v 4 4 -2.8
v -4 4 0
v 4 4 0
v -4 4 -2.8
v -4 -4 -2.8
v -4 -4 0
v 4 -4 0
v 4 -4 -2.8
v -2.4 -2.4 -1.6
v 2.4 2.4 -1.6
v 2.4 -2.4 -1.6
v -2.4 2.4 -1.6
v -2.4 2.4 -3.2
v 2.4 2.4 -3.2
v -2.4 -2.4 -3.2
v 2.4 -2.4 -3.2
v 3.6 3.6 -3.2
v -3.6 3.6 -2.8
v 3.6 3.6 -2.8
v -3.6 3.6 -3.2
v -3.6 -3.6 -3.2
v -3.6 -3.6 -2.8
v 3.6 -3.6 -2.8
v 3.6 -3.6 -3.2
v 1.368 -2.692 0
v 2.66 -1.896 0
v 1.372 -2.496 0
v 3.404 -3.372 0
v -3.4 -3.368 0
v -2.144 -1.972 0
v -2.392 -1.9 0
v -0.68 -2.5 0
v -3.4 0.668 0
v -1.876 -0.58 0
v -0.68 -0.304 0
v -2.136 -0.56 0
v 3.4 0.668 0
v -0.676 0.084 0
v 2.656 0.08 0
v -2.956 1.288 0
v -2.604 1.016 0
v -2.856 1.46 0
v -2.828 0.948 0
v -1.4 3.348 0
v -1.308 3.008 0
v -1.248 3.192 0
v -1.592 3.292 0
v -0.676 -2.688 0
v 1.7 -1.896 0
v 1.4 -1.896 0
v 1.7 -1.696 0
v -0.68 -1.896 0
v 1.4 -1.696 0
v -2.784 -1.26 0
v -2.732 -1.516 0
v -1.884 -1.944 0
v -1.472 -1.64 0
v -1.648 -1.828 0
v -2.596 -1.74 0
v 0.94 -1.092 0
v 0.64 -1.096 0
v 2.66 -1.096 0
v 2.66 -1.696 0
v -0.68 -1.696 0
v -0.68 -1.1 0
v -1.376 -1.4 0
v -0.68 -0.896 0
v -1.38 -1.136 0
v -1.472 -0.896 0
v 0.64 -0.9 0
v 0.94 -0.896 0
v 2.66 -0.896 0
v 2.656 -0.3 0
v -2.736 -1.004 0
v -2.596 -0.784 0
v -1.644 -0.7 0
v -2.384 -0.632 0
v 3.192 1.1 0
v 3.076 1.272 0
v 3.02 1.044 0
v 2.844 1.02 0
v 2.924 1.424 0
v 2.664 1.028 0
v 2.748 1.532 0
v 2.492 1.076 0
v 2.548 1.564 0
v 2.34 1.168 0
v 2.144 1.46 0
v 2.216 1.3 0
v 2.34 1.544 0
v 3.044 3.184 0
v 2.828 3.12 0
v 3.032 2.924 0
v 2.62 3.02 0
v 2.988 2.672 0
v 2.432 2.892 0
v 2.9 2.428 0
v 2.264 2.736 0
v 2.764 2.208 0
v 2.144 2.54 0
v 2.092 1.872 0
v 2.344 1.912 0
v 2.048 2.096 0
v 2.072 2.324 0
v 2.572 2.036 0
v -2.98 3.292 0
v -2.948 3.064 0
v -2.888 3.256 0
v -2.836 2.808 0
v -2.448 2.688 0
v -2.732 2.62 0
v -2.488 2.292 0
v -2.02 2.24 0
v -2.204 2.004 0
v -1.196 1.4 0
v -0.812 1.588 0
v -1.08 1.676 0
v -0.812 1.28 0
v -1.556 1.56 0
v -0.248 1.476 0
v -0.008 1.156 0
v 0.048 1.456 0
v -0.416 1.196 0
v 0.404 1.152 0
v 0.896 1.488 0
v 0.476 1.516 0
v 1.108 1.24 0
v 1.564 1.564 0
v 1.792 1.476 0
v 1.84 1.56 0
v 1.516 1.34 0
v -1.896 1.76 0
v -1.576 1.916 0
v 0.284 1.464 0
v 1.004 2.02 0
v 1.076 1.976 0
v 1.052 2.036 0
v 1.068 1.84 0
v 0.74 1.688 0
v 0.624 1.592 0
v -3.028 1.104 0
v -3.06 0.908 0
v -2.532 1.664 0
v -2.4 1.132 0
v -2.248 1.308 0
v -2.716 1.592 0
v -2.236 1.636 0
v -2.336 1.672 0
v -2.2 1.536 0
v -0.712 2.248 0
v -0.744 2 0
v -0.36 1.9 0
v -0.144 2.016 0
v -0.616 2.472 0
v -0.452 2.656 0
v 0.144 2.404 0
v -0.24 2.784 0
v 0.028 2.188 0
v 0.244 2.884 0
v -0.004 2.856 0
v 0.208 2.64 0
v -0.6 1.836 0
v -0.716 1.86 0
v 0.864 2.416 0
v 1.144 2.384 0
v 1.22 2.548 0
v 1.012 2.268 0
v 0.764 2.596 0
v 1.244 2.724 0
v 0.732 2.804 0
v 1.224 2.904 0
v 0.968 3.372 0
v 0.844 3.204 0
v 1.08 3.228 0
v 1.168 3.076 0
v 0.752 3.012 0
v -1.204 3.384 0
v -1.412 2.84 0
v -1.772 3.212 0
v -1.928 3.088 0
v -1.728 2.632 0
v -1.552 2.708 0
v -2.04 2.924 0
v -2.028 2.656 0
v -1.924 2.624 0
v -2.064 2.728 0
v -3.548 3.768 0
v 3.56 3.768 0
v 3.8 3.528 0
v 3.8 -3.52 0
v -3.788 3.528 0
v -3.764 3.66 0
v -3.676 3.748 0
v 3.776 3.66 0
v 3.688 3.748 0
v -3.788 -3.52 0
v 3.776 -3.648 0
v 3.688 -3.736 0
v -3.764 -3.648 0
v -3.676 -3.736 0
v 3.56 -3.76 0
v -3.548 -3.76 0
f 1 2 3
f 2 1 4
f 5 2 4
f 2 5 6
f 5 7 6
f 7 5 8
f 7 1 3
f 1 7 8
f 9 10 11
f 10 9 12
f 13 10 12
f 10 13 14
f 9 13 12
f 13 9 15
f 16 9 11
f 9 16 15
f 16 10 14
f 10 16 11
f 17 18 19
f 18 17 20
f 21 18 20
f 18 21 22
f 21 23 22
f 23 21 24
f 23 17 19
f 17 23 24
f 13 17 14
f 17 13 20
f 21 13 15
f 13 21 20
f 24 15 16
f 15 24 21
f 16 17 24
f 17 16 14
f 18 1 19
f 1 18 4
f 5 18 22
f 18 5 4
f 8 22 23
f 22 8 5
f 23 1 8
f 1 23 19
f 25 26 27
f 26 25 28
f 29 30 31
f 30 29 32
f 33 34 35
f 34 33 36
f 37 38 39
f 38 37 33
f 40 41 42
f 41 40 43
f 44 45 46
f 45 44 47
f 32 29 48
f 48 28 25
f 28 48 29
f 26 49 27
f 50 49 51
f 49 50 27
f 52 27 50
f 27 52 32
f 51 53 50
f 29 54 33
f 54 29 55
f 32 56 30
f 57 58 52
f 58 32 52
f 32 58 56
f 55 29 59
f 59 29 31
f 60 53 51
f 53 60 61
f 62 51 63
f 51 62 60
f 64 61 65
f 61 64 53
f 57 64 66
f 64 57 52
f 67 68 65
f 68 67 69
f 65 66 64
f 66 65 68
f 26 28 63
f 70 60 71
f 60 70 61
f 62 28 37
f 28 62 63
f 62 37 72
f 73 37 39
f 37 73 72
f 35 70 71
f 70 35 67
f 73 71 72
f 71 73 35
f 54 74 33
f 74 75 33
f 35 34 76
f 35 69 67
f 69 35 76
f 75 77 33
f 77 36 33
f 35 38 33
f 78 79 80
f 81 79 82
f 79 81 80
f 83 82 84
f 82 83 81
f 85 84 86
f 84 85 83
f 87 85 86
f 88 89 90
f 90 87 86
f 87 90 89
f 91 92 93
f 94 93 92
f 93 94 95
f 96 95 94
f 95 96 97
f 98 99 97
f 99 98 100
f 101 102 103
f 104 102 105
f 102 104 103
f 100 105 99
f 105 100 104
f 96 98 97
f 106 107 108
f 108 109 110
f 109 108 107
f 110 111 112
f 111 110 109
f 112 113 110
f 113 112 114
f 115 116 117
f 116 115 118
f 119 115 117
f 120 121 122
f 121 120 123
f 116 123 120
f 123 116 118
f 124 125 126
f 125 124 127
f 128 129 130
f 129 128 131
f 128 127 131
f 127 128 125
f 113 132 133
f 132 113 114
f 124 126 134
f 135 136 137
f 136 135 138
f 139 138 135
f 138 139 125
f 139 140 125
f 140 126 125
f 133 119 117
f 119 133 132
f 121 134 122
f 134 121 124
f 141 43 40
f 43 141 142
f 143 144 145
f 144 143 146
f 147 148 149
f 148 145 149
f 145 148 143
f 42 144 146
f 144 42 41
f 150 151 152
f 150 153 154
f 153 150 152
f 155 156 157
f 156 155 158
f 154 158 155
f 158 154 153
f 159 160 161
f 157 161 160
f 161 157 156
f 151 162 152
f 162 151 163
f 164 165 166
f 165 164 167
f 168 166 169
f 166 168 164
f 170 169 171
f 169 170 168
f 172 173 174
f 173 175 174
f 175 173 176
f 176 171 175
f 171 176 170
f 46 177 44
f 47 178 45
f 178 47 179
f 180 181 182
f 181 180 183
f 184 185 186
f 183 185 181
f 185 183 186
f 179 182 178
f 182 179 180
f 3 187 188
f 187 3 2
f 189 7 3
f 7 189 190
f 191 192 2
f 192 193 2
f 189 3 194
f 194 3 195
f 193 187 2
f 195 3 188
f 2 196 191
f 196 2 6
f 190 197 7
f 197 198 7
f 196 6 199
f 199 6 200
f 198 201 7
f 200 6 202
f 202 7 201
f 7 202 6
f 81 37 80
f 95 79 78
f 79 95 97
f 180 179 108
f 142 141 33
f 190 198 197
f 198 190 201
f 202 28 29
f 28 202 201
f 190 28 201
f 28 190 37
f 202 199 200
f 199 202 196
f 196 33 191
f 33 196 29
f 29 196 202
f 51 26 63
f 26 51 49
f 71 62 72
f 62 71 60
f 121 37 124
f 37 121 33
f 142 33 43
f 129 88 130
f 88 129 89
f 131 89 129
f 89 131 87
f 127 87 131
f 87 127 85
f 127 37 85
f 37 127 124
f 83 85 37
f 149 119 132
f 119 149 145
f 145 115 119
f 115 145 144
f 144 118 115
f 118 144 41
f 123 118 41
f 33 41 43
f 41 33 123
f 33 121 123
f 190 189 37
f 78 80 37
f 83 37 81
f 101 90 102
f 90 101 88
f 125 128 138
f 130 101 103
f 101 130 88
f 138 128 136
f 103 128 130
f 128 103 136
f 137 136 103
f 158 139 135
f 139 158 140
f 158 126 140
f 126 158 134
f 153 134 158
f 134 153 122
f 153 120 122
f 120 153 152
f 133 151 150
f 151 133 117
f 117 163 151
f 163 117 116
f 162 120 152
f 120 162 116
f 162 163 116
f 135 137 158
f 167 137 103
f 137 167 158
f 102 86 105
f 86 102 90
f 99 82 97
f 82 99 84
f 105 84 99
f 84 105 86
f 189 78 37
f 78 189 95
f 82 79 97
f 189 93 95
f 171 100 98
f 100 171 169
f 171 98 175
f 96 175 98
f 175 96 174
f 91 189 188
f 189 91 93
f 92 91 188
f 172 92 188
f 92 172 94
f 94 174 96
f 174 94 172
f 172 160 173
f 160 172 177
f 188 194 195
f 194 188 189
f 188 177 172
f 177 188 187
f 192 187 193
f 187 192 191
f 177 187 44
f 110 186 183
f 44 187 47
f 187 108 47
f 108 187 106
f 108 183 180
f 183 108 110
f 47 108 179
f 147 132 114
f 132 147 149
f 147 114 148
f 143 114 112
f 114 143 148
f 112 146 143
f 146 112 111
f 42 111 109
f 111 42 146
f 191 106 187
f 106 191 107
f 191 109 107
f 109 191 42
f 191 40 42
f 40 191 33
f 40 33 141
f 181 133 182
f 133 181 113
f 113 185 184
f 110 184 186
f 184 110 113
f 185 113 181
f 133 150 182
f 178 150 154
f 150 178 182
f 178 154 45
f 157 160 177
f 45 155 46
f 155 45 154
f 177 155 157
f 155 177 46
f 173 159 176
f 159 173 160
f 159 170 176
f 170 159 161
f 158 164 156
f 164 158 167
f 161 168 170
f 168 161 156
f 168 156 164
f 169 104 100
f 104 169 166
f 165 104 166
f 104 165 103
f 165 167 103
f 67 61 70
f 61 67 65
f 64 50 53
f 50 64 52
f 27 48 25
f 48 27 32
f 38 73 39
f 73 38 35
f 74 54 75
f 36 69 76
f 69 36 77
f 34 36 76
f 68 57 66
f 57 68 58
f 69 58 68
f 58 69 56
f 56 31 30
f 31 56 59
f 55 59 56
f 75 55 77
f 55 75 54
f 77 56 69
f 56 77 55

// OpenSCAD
// file: ../p/box5.scad
use <../lib.scad>
function ldraw_lib__box5() = [
// 0 Box with 5 Faces and All Edges
// 0 Name: box5.dat
// 0 Author: James Jessiman
// 0 !LDRAW_ORG Primitive UPDATE 2012-01
// 0 !LICENSE Licensed under CC BY 4.0 : see CAreadme.txt
// 
// 0 BFC CERTIFY CCW
  [0,"BFC","CERTIFY"],
  [0,"BFC","CCW"],
// 
// 0 !HISTORY 2002-04-03 [sbliss] Modified for BFC compliance
// 0 !HISTORY 2002-04-25 [PTadmin] Official Update 2002-02
// 0 !HISTORY 2007-06-24 [PTadmin] Header formatted for Contributor Agreement
// 0 !HISTORY 2008-07-01 [PTadmin] Official Update 2008-01
// 0 !HISTORY 2012-02-16 [Philo] Changed to CCW
// 0 !HISTORY 2012-03-30 [PTadmin] Official Update 2012-01
// 
// 
// 2 24 1 1 1 -1 1 1
  [2,24,1,1,1,-1,1,1],
// 2 24 -1 1 1 -1 1 -1
  [2,24,-1,1,1,-1,1,-1],
// 2 24 -1 1 -1 1 1 -1
  [2,24,-1,1,-1,1,1,-1],
// 2 24 1 1 -1 1 1 1
  [2,24,1,1,-1,1,1,1],
// 2 24 1 0 1 -1 0 1
  [2,24,1,0,1,-1,0,1],
// 2 24 -1 0 1 -1 0 -1
  [2,24,-1,0,1,-1,0,-1],
// 2 24 -1 0 -1 1 0 -1
  [2,24,-1,0,-1,1,0,-1],
// 2 24 1 0 -1 1 0 1
  [2,24,1,0,-1,1,0,1],
// 2 24 1 0 1 1 1 1
  [2,24,1,0,1,1,1,1],
// 2 24 -1 0 1 -1 1 1
  [2,24,-1,0,1,-1,1,1],
// 2 24 1 0 -1 1 1 -1
  [2,24,1,0,-1,1,1,-1],
// 2 24 -1 0 -1 -1 1 -1
  [2,24,-1,0,-1,-1,1,-1],
// 4 16 -1 1 1 1 1 1 1 1 -1 -1 1 -1
  [4,16,-1,1,1,1,1,1,1,1,-1,-1,1,-1],
// 4 16 -1 1 1 -1 0 1 1 0 1 1 1 1
  [4,16,-1,1,1,-1,0,1,1,0,1,1,1,1],
// 4 16 -1 1 -1 -1 0 -1 -1 0 1 -1 1 1
  [4,16,-1,1,-1,-1,0,-1,-1,0,1,-1,1,1],
// 4 16 1 1 -1 1 0 -1 -1 0 -1 -1 1 -1
  [4,16,1,1,-1,1,0,-1,-1,0,-1,-1,1,-1],
// 4 16 1 1 1 1 0 1 1 0 -1 1 1 -1
  [4,16,1,1,1,1,0,1,1,0,-1,1,1,-1],
];
module ldraw_lib__box5(step=0, col=false, unit=2/5, alt=false, line=0.2, solid=!$preview)
    makepoly(ldraw_lib__box5(), step=step, col=col, unit=unit, alt=alt, line=line, solid=solid);
ldraw_lib__box5(line=0.2);
// file: ../p/box4.scad
use <../lib.scad>
function ldraw_lib__box4() = [
// 0 Box with 4 Faces (2 Parallel Pairs) and All Edges
// 0 Name: box4.dat
// 0 Author: James Jessiman
// 0 !LDRAW_ORG Primitive UPDATE 2012-01
// 0 !LICENSE Licensed under CC BY 4.0 : see CAreadme.txt
// 
// 0 BFC CERTIFY CCW
  [0,"BFC","CERTIFY"],
  [0,"BFC","CCW"],
// 
// 0 !HISTORY 2002-04-03 [sbliss] Modified for BFC compliance
// 0 !HISTORY 2002-04-25 [PTadmin] Official Update 2002-02
// 0 !HISTORY 2007-06-24 [PTadmin] Header formatted for Contributor Agreement
// 0 !HISTORY 2008-07-01 [PTadmin] Official Update 2008-01
// 0 !HISTORY 2012-02-16 [Philo] Changed to CCW
// 0 !HISTORY 2012-03-30 [PTadmin] Official Update 2012-01
// 
// 
// 2 24 1 1 1 -1 1 1
  [2,24,1,1,1,-1,1,1],
// 2 24 -1 1 1 -1 1 -1
  [2,24,-1,1,1,-1,1,-1],
// 2 24 -1 1 -1 1 1 -1
  [2,24,-1,1,-1,1,1,-1],
// 2 24 1 1 -1 1 1 1
  [2,24,1,1,-1,1,1,1],
// 2 24 1 0 1 -1 0 1
  [2,24,1,0,1,-1,0,1],
// 2 24 -1 0 1 -1 0 -1
  [2,24,-1,0,1,-1,0,-1],
// 2 24 -1 0 -1 1 0 -1
  [2,24,-1,0,-1,1,0,-1],
// 2 24 1 0 -1 1 0 1
  [2,24,1,0,-1,1,0,1],
// 2 24 1 0 1 1 1 1
  [2,24,1,0,1,1,1,1],
// 2 24 -1 0 1 -1 1 1
  [2,24,-1,0,1,-1,1,1],
// 2 24 1 0 -1 1 1 -1
  [2,24,1,0,-1,1,1,-1],
// 2 24 -1 0 -1 -1 1 -1
  [2,24,-1,0,-1,-1,1,-1],
// 4 16 -1 1 1 -1 0 1 1 0 1 1 1 1
  [4,16,-1,1,1,-1,0,1,1,0,1,1,1,1],
// 4 16 -1 1 -1 -1 0 -1 -1 0 1 -1 1 1
  [4,16,-1,1,-1,-1,0,-1,-1,0,1,-1,1,1],
// 4 16 1 1 -1 1 0 -1 -1 0 -1 -1 1 -1
  [4,16,1,1,-1,1,0,-1,-1,0,-1,-1,1,-1],
// 4 16 1 1 1 1 0 1 1 0 -1 1 1 -1
  [4,16,1,1,1,1,0,1,1,0,-1,1,1,-1],
];
module ldraw_lib__box4(step=0, col=false, unit=2/5, alt=false, line=0.2, solid=!$preview)
    makepoly(ldraw_lib__box4(), step=step, col=col, unit=unit, alt=alt, line=line, solid=solid);
ldraw_lib__box4(line=0.2);
// file: s/3070bs01.scad
use <../../lib.scad>
use <../../p/box4.scad>
use <../../p/box5.scad>
function ldraw_lib__s__3070bs01() = [
// 0 ~Tile  1 x  1 with Groove without Top Face
// 0 Name: s\3070bs01.dat
// 0 Author: Chris Dee [cwdee]
// 0 !LDRAW_ORG Subpart UPDATE 2009-02
// 0 !LICENSE Licensed under CC BY 4.0 : see CAreadme.txt
// 
// 0 BFC CERTIFY CCW
  [0,"BFC","CERTIFY"],
  [0,"BFC","CCW"],
// 
// 0 !HISTORY 2009-09-03 [PTadmin] Official Update 2009-02
// 
// 
// 1 16 0 0 0 10 0 0 0 7 0 0 0 10 box4.dat
  [1,16,0,0,0,10,0,0,0,7,0,0,0,10, ldraw_lib__box4()],
// 0 BFC INVERTNEXT
  [0,"BFC","INVERTNEXT"],
// 1 16 0 8 0 6 0 0 0 -4 0 0 0 6 box5.dat
  [1,16,0,8,0,6,0,0,0,-4,0,0,0,6, ldraw_lib__box5()],
// 1 16 0 7 0 9 0 0 0 1 0 0 0 9 box4.dat
  [1,16,0,7,0,9,0,0,0,1,0,0,0,9, ldraw_lib__box4()],
// 
// 4 16 9 8 9 6 8 6 -6 8 6 -9 8 9
  [4,16,9,8,9,6,8,6,-6,8,6,-9,8,9],
// 4 16 -9 8 9 -6 8 6 -6 8 -6 -9 8 -9
  [4,16,-9,8,9,-6,8,6,-6,8,-6,-9,8,-9],
// 4 16 -9 8 -9 -6 8 -6 6 8 -6 9 8 -9
  [4,16,-9,8,-9,-6,8,-6,6,8,-6,9,8,-9],
// 4 16 9 8 -9 6 8 -6 6 8 6 9 8 9
  [4,16,9,8,-9,6,8,-6,6,8,6,9,8,9],
// 
// 4 16 10 7 10 9 7 9 -9 7 9 -10 7 10
  [4,16,10,7,10,9,7,9,-9,7,9,-10,7,10],
// 4 16 -10 7 10 -9 7 9 -9 7 -9 -10 7 -10
  [4,16,-10,7,10,-9,7,9,-9,7,-9,-10,7,-10],
// 4 16 -10 7 -10 -9 7 -9 9 7 -9 10 7 -10
  [4,16,-10,7,-10,-9,7,-9,9,7,-9,10,7,-10],
// 4 16 10 7 -10 9 7 -9 9 7 9 10 7 10
  [4,16,10,7,-10,9,7,-9,9,7,9,10,7,10],
// 0
];
module ldraw_lib__s__3070bs01(step=0, col=false, unit=2/5, alt=false, line=0.2, solid=!$preview)
    makepoly(ldraw_lib__s__3070bs01(), step=step, col=col, unit=unit, alt=alt, line=line, solid=solid);
ldraw_lib__s__3070bs01(line=0.2);
// main file
use <../lib.scad>
use <s/3070bs01.scad>
function ldraw_lib__3070bp1r() = [
// 0 Tile  1 x  1 with Dark Green Sign with White Leaves Pattern
// 0 Name: 3070bp1r.dat
// 0 Author: Philippe Hurbain [Philo]
// 0 !LDRAW_ORG Part UPDATE 2025-07
// 0 !LICENSE Licensed under CC BY 4.0 : see CAreadme.txt
// 
// 0 BFC CERTIFY CCW
  [0,"BFC","CERTIFY"],
  [0,"BFC","CCW"],
// 
// 0 !KEYWORDS Bricklink 3070pb367, Friends, Rebrickable 3070bpr0324, Set 21353
// 0 !KEYWORDS Set 42670, The Botanical Garden
// 
// 0 !HISTORY 2025-07-27 [OrionP] Official Update 2025-07
// 
// 1 16 0 0 0 1 0 0 0 1 0 0 0 1 s\3070bs01.dat
  [1,16,0,0,0,1,0,0,0,1,0,0,0,1, ldraw_lib__s__3070bs01()],
// 4 15 3.43 0 -6.24 3.42 0 -6.73 8.51 0 -8.43 6.65 0 -4.74
  [4,15,3.43,0,-6.24,3.42,0,-6.73,8.51,0,-8.43,6.65,0,-4.74],
// 4 15 -1.7 0 -6.25 -5.36 0 -4.93 -5.98 0 -4.75 -8.5 0 -8.42
  [4,15,-1.7,0,-6.25,-5.36,0,-4.93,-5.98,0,-4.75,-8.5,0,-8.42],
// 4 15 -1.7 0 -.76 -8.5 0 1.67 -5.34 0 -1.4 -4.69 0 -1.45
  [4,15,-1.7,0,-.76,-8.5,0,1.67,-5.34,0,-1.4,-4.69,0,-1.45],
// 4 15 -8.5 0 1.67 -1.69 0 .21 6.64 0 .2 8.5 0 1.67
  [4,15,-8.5,0,1.67,-1.69,0,.21,6.64,0,.2,8.5,0,1.67],
// 4 15 -7.14 0 3.65 -7.39 0 3.22 -7.07 0 2.37 -6.51 0 2.54
  [4,15,-7.14,0,3.65,-7.39,0,3.22,-7.07,0,2.37,-6.51,0,2.54],
// 4 15 -3.12 0 7.98 -3.5 0 8.37 -3.98 0 8.23 -3.27 0 7.52
  [4,15,-3.12,0,7.98,-3.5,0,8.37,-3.98,0,8.23,-3.27,0,7.52],
// 3 15 -1.7 0 -6.25 -8.5 0 -8.42 -1.69 0 -6.72
  [3,15,-1.7,0,-6.25,-8.5,0,-8.42,-1.69,0,-6.72],
// 4 15 -8.5 0 -8.42 8.51 0 -8.43 3.42 0 -6.73 -1.69 0 -6.72
  [4,15,-8.5,0,-8.42,8.51,0,-8.43,3.42,0,-6.73,-1.69,0,-6.72],
// 3 15 6.65 0 -4.74 4.25 0 -4.74 3.43 0 -6.24
  [3,15,6.65,0,-4.74,4.25,0,-4.74,3.43,0,-6.24],
// 4 15 4.25 0 -4.24 3.5 0 -4.74 3.43 0 -6.24 4.25 0 -4.74
  [4,15,4.25,0,-4.24,3.5,0,-4.74,3.43,0,-6.24,4.25,0,-4.74],
// 4 15 -1.7 0 -6.25 3.43 0 -6.24 3.5 0 -4.74 -1.7 0 -4.74
  [4,15,-1.7,0,-6.25,3.43,0,-6.24,3.5,0,-4.74,-1.7,0,-4.74],
// 3 15 4.25 0 -4.24 3.5 0 -4.24 3.5 0 -4.74
  [3,15,4.25,0,-4.24,3.5,0,-4.24,3.5,0,-4.74],
// 4 15 -8.5 0 1.67 -8.5 0 -8.42 -6.83 0 -3.79 -6.96 0 -3.15
  [4,15,-8.5,0,1.67,-8.5,0,-8.42,-6.83,0,-3.79,-6.96,0,-3.15],
// 3 15 -1.7 0 -6.25 -4.71 0 -4.86 -5.36 0 -4.93
  [3,15,-1.7,0,-6.25,-4.71,0,-4.86,-5.36,0,-4.93],
// 3 15 -3.68 0 -4.1 -4.12 0 -4.57 -1.7 0 -4.74
  [3,15,-3.68,0,-4.1,-4.12,0,-4.57,-1.7,0,-4.74],
// 4 15 -1.7 0 -4.74 -4.12 0 -4.57 -4.71 0 -4.86 -1.7 0 -6.25
  [4,15,-1.7,0,-4.74,-4.12,0,-4.57,-4.71,0,-4.86,-1.7,0,-6.25],
// 3 15 -6.83 0 -3.79 -8.5 0 -8.42 -6.49 0 -4.35
  [3,15,-6.83,0,-3.79,-8.5,0,-8.42,-6.49,0,-4.35],
// 3 15 -6.49 0 -4.35 -8.5 0 -8.42 -5.98 0 -4.75
  [3,15,-6.49,0,-4.35,-8.5,0,-8.42,-5.98,0,-4.75],
// 4 15 1.6 0 -2.74 3.5 0 -4.24 4.25 0 -4.24 2.35 0 -2.73
  [4,15,1.6,0,-2.74,3.5,0,-4.24,4.25,0,-4.24,2.35,0,-2.73],
// 4 15 6.65 0 -4.24 6.65 0 -2.74 2.35 0 -2.73 4.25 0 -4.24
  [4,15,6.65,0,-4.24,6.65,0,-2.74,2.35,0,-2.73,4.25,0,-4.24],
// 4 15 -1.7 0 -2.75 -1.7 0 -4.24 3.5 0 -4.24 1.6 0 -2.74
  [4,15,-1.7,0,-2.75,-1.7,0,-4.24,3.5,0,-4.24,1.6,0,-2.74],
// 4 15 -1.7 0 -4.74 -1.7 0 -4.24 -3.44 0 -3.5 -3.68 0 -4.1
  [4,15,-1.7,0,-4.74,-1.7,0,-4.24,-3.44,0,-3.5,-3.68,0,-4.1],
// 4 15 -3.68 0 -2.24 -3.45 0 -2.84 -1.7 0 -2.75 -1.7 0 -2.24
  [4,15,-3.68,0,-2.24,-3.45,0,-2.84,-1.7,0,-2.75,-1.7,0,-2.24],
// 4 15 -3.45 0 -2.84 -3.44 0 -3.5 -1.7 0 -4.24 -1.7 0 -2.75
  [4,15,-3.45,0,-2.84,-3.44,0,-3.5,-1.7,0,-4.24,-1.7,0,-2.75],
// 3 15 6.65 0 -4.74 8.51 0 -8.43 6.65 0 -4.24
  [3,15,6.65,0,-4.74,8.51,0,-8.43,6.65,0,-4.24],
// 4 15 1.6 0 -2.74 2.35 0 -2.73 2.35 0 -2.24 1.6 0 -2.25
  [4,15,1.6,0,-2.74,2.35,0,-2.73,2.35,0,-2.24,1.6,0,-2.25],
// 4 15 8.5 0 1.67 6.65 0 -2.74 6.65 0 -4.24 8.51 0 -8.43
  [4,15,8.5,0,1.67,6.65,0,-2.74,6.65,0,-4.24,8.51,0,-8.43],
// 3 15 6.65 0 -2.74 8.5 0 1.67 6.65 0 -2.24
  [3,15,6.65,0,-2.74,8.5,0,1.67,6.65,0,-2.24],
// 4 15 6.64 0 .2 6.64 0 -.75 6.65 0 -2.24 8.5 0 1.67
  [4,15,6.64,0,.2,6.64,0,-.75,6.65,0,-2.24,8.5,0,1.67],
// 4 15 2.35 0 -2.24 -1.7 0 -.76 -1.7 0 -2.24 1.6 0 -2.25
  [4,15,2.35,0,-2.24,-1.7,0,-.76,-1.7,0,-2.24,1.6,0,-2.25],
// 4 15 -1.7 0 -.76 2.35 0 -2.24 6.65 0 -2.24 6.64 0 -.75
  [4,15,-1.7,0,-.76,2.35,0,-2.24,6.65,0,-2.24,6.64,0,-.75],
// 3 15 -6.96 0 -3.15 -6.84 0 -2.51 -8.5 0 1.67
  [3,15,-6.96,0,-3.15,-6.84,0,-2.51,-8.5,0,1.67],
// 3 15 -6.84 0 -2.51 -6.49 0 -1.96 -8.5 0 1.67
  [3,15,-6.84,0,-2.51,-6.49,0,-1.96,-8.5,0,1.67],
// 3 15 -1.7 0 -.76 -4.69 0 -1.45 -4.11 0 -1.75
  [3,15,-1.7,0,-.76,-4.69,0,-1.45,-4.11,0,-1.75],
// 4 15 -1.7 0 -2.24 -1.7 0 -.76 -4.11 0 -1.75 -3.68 0 -2.24
  [4,15,-1.7,0,-2.24,-1.7,0,-.76,-4.11,0,-1.75,-3.68,0,-2.24],
// 3 15 -6.49 0 -1.96 -5.96 0 -1.58 -8.5 0 1.67
  [3,15,-6.49,0,-1.96,-5.96,0,-1.58,-8.5,0,1.67],
// 3 15 -5.96 0 -1.58 -5.34 0 -1.4 -8.5 0 1.67
  [3,15,-5.96,0,-1.58,-5.34,0,-1.4,-8.5,0,1.67],
// 3 15 -1.7 0 -.76 -1.69 0 .21 -8.5 0 1.67
  [3,15,-1.7,0,-.76,-1.69,0,.21,-8.5,0,1.67],
// 3 15 7.98 0 2.75 7.69 0 3.18 7.55 0 2.61
  [3,15,7.98,0,2.75,7.69,0,3.18,7.55,0,2.61],
// 4 15 7.31 0 3.56 7.11 0 2.55 7.55 0 2.61 7.69 0 3.18
  [4,15,7.31,0,3.56,7.11,0,2.55,7.55,0,2.61,7.69,0,3.18],
// 4 15 6.87 0 3.83 6.66 0 2.57 7.11 0 2.55 7.31 0 3.56
  [4,15,6.87,0,3.83,6.66,0,2.57,7.11,0,2.55,7.31,0,3.56],
// 4 15 6.37 0 3.91 6.23 0 2.69 6.66 0 2.57 6.87 0 3.83
  [4,15,6.37,0,3.91,6.23,0,2.69,6.66,0,2.57,6.87,0,3.83],
// 3 15 5.85 0 2.92 6.23 0 2.69 6.37 0 3.91
  [3,15,5.85,0,2.92,6.23,0,2.69,6.37,0,3.91],
// 3 15 5.36 0 3.65 5.54 0 3.25 5.85 0 3.86
  [3,15,5.36,0,3.65,5.54,0,3.25,5.85,0,3.86],
// 4 15 5.54 0 3.25 5.85 0 2.92 6.37 0 3.91 5.85 0 3.86
  [4,15,5.54,0,3.25,5.85,0,2.92,6.37,0,3.91,5.85,0,3.86],
// 3 15 7.61 0 7.96 7.07 0 7.8 7.58 0 7.31
  [3,15,7.61,0,7.96,7.07,0,7.8,7.58,0,7.31],
// 4 15 7.07 0 7.8 6.55 0 7.55 7.47 0 6.68 7.58 0 7.31
  [4,15,7.07,0,7.8,6.55,0,7.55,7.47,0,6.68,7.58,0,7.31],
// 4 15 7.25 0 6.07 7.47 0 6.68 6.55 0 7.55 6.08 0 7.23
  [4,15,7.25,0,6.07,7.47,0,6.68,6.55,0,7.55,6.08,0,7.23],
// 4 15 7.25 0 6.07 5.66 0 6.84 5.36 0 6.35 6.91 0 5.52
  [4,15,7.25,0,6.07,5.66,0,6.84,5.36,0,6.35,6.91,0,5.52],
// 3 15 5.23 0 4.68 5.86 0 4.78 5.12 0 5.24
  [3,15,5.23,0,4.68,5.86,0,4.78,5.12,0,5.24],
// 4 15 6.43 0 5.09 5.18 0 5.81 5.12 0 5.24 5.86 0 4.78
  [4,15,6.43,0,5.09,5.18,0,5.81,5.12,0,5.24,5.86,0,4.78],
// 4 15 6.91 0 5.52 5.36 0 6.35 5.18 0 5.81 6.43 0 5.09
  [4,15,6.91,0,5.52,5.36,0,6.35,5.18,0,5.81,6.43,0,5.09],
// 3 15 6.08 0 7.23 5.66 0 6.84 7.25 0 6.07
  [3,15,6.08,0,7.23,5.66,0,6.84,7.25,0,6.07],
// 3 15 -7.45 0 8.23 -7.37 0 7.66 -7.22 0 8.14
  [3,15,-7.45,0,8.23,-7.37,0,7.66,-7.22,0,8.14],
// 4 15 -7.37 0 7.66 -7.09 0 7.02 -6.12 0 6.72 -7.22 0 8.14
  [4,15,-7.37,0,7.66,-7.09,0,7.02,-6.12,0,6.72,-7.22,0,8.14],
// 4 15 -7.09 0 7.02 -6.83 0 6.55 -6.22 0 5.73 -6.12 0 6.72
  [4,15,-7.09,0,7.02,-6.83,0,6.55,-6.22,0,5.73,-6.12,0,6.72],
// 4 15 -5.51 0 5.01 -5.05 0 5.6 -6.12 0 6.72 -6.22 0 5.73
  [4,15,-5.51,0,5.01,-5.05,0,5.6,-6.12,0,6.72,-6.22,0,5.73],
// 4 15 -2.7 0 4.19 -2.99 0 3.5 -2.03 0 3.2 -2.03 0 3.97
  [4,15,-2.7,0,4.19,-2.99,0,3.5,-2.03,0,3.2,-2.03,0,3.97],
// 3 15 -3.89 0 3.9 -2.99 0 3.5 -2.7 0 4.19
  [3,15,-3.89,0,3.9,-2.99,0,3.5,-2.7,0,4.19],
// 4 15 .12 0 3.64 -.62 0 3.69 -1.04 0 2.99 -.02 0 2.89
  [4,15,.12,0,3.64,-.62,0,3.69,-1.04,0,2.99,-.02,0,2.89],
// 4 15 -.62 0 3.69 -2.03 0 3.97 -2.03 0 3.2 -1.04 0 2.99
  [4,15,-.62,0,3.69,-2.03,0,3.97,-2.03,0,3.2,-1.04,0,2.99],
// 4 15 1.19 0 3.79 1.01 0 2.88 2.77 0 3.1 2.24 0 3.72
  [4,15,1.19,0,3.79,1.01,0,2.88,2.77,0,3.1,2.24,0,3.72],
// 4 15 3.79 0 3.35 4.48 0 3.69 4.6 0 3.9 3.91 0 3.91
  [4,15,3.79,0,3.35,4.48,0,3.69,4.6,0,3.9,3.91,0,3.91],
// 4 15 3.79 0 3.35 3.91 0 3.91 2.24 0 3.72 2.77 0 3.1
  [4,15,3.79,0,3.35,3.91,0,3.91,2.24,0,3.72,2.77,0,3.1],
// 4 15 -5.51 0 5.01 -4.74 0 4.4 -3.94 0 4.79 -5.05 0 5.6
  [4,15,-5.51,0,5.01,-4.74,0,4.4,-3.94,0,4.79,-5.05,0,5.6],
// 3 15 1.01 0 2.88 1.19 0 3.79 .71 0 3.66
  [3,15,1.01,0,2.88,1.19,0,3.79,.71,0,3.66],
// 4 15 2.67 0 4.6 2.69 0 4.94 2.63 0 5.09 2.51 0 5.05
  [4,15,2.67,0,4.6,2.69,0,4.94,2.63,0,5.09,2.51,0,5.05],
// 4 15 2.24 0 3.72 2.67 0 4.6 2.51 0 5.05 1.85 0 4.22
  [4,15,2.24,0,3.72,2.67,0,4.6,2.51,0,5.05,1.85,0,4.22],
// 3 15 1.85 0 4.22 1.56 0 3.98 2.24 0 3.72
  [3,15,1.85,0,4.22,1.56,0,3.98,2.24,0,3.72],
// 3 15 1.56 0 3.98 1.19 0 3.79 2.24 0 3.72
  [3,15,1.56,0,3.98,1.19,0,3.79,2.24,0,3.72],
// 4 15 -4.74 0 4.4 -3.89 0 3.9 -2.7 0 4.19 -3.94 0 4.79
  [4,15,-4.74,0,4.4,-3.89,0,3.9,-2.7,0,4.19,-3.94,0,4.79],
// 4 15 1.01 0 2.88 .71 0 3.66 .12 0 3.64 -.02 0 2.89
  [4,15,1.01,0,2.88,.71,0,3.66,.12,0,3.64,-.02,0,2.89],
// 4 15 -7.65 0 2.27 -7.07 0 2.37 -7.39 0 3.22 -7.57 0 2.76
  [4,15,-7.65,0,2.27,-7.07,0,2.37,-7.39,0,3.22,-7.57,0,2.76],
// 4 15 -6.79 0 3.98 -6 0 2.83 -5.62 0 3.27 -6.33 0 4.16
  [4,15,-6.79,0,3.98,-6,0,2.83,-5.62,0,3.27,-6.33,0,4.16],
// 3 15 -5.59 0 4.09 -5.84 0 4.18 -5.5 0 3.84
  [3,15,-5.59,0,4.09,-5.84,0,4.18,-5.5,0,3.84],
// 4 15 -6.33 0 4.16 -5.62 0 3.27 -5.5 0 3.84 -5.84 0 4.18
  [4,15,-6.33,0,4.16,-5.62,0,3.27,-5.5,0,3.84,-5.84,0,4.18],
// 4 15 -6.79 0 3.98 -7.14 0 3.65 -6.51 0 2.54 -6 0 2.83
  [4,15,-6.79,0,3.98,-7.14,0,3.65,-6.51,0,2.54,-6,0,2.83],
// 3 15 -1.78 0 5.62 -1.86 0 5 -.9 0 4.75
  [3,15,-1.78,0,5.62,-1.86,0,5,-.9,0,4.75],
// 4 15 -.9 0 4.75 -.36 0 5.04 -1.54 0 6.18 -1.78 0 5.62
  [4,15,-.9,0,4.75,-.36,0,5.04,-1.54,0,6.18,-1.78,0,5.62],
// 4 15 .07 0 5.47 .36 0 6.01 -.6 0 6.96 -1.13 0 6.64
  [4,15,.07,0,5.47,.36,0,6.01,-.6,0,6.96,-1.13,0,6.64],
// 4 15 -1.13 0 6.64 -1.54 0 6.18 -.36 0 5.04 .07 0 5.47
  [4,15,-1.13,0,6.64,-1.54,0,6.18,-.36,0,5.04,.07,0,5.47],
// 3 15 .61 0 7.21 -.01 0 7.14 .52 0 6.6
  [3,15,.61,0,7.21,-.01,0,7.14,.52,0,6.6],
// 4 15 -.01 0 7.14 -.6 0 6.96 .36 0 6.01 .52 0 6.6
  [4,15,-.01,0,7.14,-.6,0,6.96,.36,0,6.01,.52,0,6.6],
// 4 15 -1.79 0 4.65 -1.5 0 4.59 -.9 0 4.75 -1.86 0 5
  [4,15,-1.79,0,4.65,-1.5,0,4.59,-.9,0,4.75,-1.86,0,5],
// 4 15 3.05 0 6.37 2.16 0 6.04 2.53 0 5.67 2.86 0 5.96
  [4,15,3.05,0,6.37,2.16,0,6.04,2.53,0,5.67,2.86,0,5.96],
// 4 15 3.11 0 6.81 1.91 0 6.49 2.16 0 6.04 3.05 0 6.37
  [4,15,3.11,0,6.81,1.91,0,6.49,2.16,0,6.04,3.05,0,6.37],
// 4 15 3.06 0 7.26 1.83 0 7.01 1.91 0 6.49 3.11 0 6.81
  [4,15,3.06,0,7.26,1.83,0,7.01,1.91,0,6.49,3.11,0,6.81],
// 3 15 2.42 0 8.43 2.11 0 8.01 2.7 0 8.07
  [3,15,2.42,0,8.43,2.11,0,8.01,2.7,0,8.07],
// 4 15 1.88 0 7.53 2.92 0 7.69 2.7 0 8.07 2.11 0 8.01
  [4,15,1.88,0,7.53,2.92,0,7.69,2.7,0,8.07,2.11,0,8.01],
// 4 15 1.83 0 7.01 3.06 0 7.26 2.92 0 7.69 1.88 0 7.53
  [4,15,1.83,0,7.01,3.06,0,7.26,2.92,0,7.69,1.88,0,7.53],
// 3 15 -3.12 0 7.98 -3.01 0 8.46 -3.5 0 8.37
  [3,15,-3.12,0,7.98,-3.01,0,8.46,-3.5,0,8.37],
// 4 15 -3.27 0 7.52 -3.98 0 8.23 -4.43 0 8.03 -3.53 0 7.1
  [4,15,-3.27,0,7.52,-3.98,0,8.23,-4.43,0,8.03,-3.53,0,7.1],
// 4 15 -3.88 0 6.77 -4.82 0 7.72 -5.1 0 7.31 -4.32 0 6.58
  [4,15,-3.88,0,6.77,-4.82,0,7.72,-5.1,0,7.31,-4.32,0,6.58],
// 3 15 -5.07 0 6.64 -4.81 0 6.56 -5.16 0 6.82
  [3,15,-5.07,0,6.64,-4.81,0,6.56,-5.16,0,6.82],
// 4 15 -4.32 0 6.58 -5.1 0 7.31 -5.16 0 6.82 -4.81 0 6.56
  [4,15,-4.32,0,6.58,-5.1,0,7.31,-5.16,0,6.82,-4.81,0,6.56],
// 4 15 -3.53 0 7.1 -4.43 0 8.03 -4.82 0 7.72 -3.88 0 6.77
  [4,15,-3.53,0,7.1,-4.43,0,8.03,-4.82,0,7.72,-3.88,0,6.77],
// 4 16 8.9 0 9.42 10 0 10 -10 0 10 -8.87 0 9.42
  [4,16,8.9,0,9.42,10,0,10,-10,0,10,-8.87,0,9.42],
// 4 16 10 0 -10 10 0 10 9.5 0 8.82 9.5 0 -8.8
  [4,16,10,0,-10,10,0,10,9.5,0,8.82,9.5,0,-8.8],
// 3 16 -9.47 0 8.82 -9.41 0 9.15 -10 0 10
  [3,16,-9.47,0,8.82,-9.41,0,9.15,-10,0,10],
// 3 16 -9.41 0 9.15 -9.19 0 9.37 -10 0 10
  [3,16,-9.41,0,9.15,-9.19,0,9.37,-10,0,10],
// 3 16 9.5 0 8.82 10 0 10 9.44 0 9.15
  [3,16,9.5,0,8.82,10,0,10,9.44,0,9.15],
// 3 16 9.44 0 9.15 10 0 10 9.22 0 9.37
  [3,16,9.44,0,9.15,10,0,10,9.22,0,9.37],
// 3 16 -9.19 0 9.37 -8.87 0 9.42 -10 0 10
  [3,16,-9.19,0,9.37,-8.87,0,9.42,-10,0,10],
// 3 16 9.22 0 9.37 10 0 10 8.9 0 9.42
  [3,16,9.22,0,9.37,10,0,10,8.9,0,9.42],
// 4 16 -10 0 -10 -9.47 0 -8.8 -9.47 0 8.82 -10 0 10
  [4,16,-10,0,-10,-9.47,0,-8.8,-9.47,0,8.82,-10,0,10],
// 3 16 9.5 0 -8.8 9.44 0 -9.12 10 0 -10
  [3,16,9.5,0,-8.8,9.44,0,-9.12,10,0,-10],
// 3 16 9.44 0 -9.12 9.22 0 -9.34 10 0 -10
  [3,16,9.44,0,-9.12,9.22,0,-9.34,10,0,-10],
// 3 16 -9.47 0 -8.8 -10 0 -10 -9.41 0 -9.12
  [3,16,-9.47,0,-8.8,-10,0,-10,-9.41,0,-9.12],
// 3 16 -9.41 0 -9.12 -10 0 -10 -9.19 0 -9.34
  [3,16,-9.41,0,-9.12,-10,0,-10,-9.19,0,-9.34],
// 3 16 9.22 0 -9.34 8.9 0 -9.4 10 0 -10
  [3,16,9.22,0,-9.34,8.9,0,-9.4,10,0,-10],
// 3 16 -9.19 0 -9.34 -10 0 -10 -8.87 0 -9.4
  [3,16,-9.19,0,-9.34,-10,0,-10,-8.87,0,-9.4],
// 4 16 -10 0 -10 10 0 -10 8.9 0 -9.4 -8.87 0 -9.4
  [4,16,-10,0,-10,10,0,-10,8.9,0,-9.4,-8.87,0,-9.4],
// 3 288 7.11 0 2.55 8.5 0 1.67 7.55 0 2.61
  [3,288,7.11,0,2.55,8.5,0,1.67,7.55,0,2.61],
// 4 288 7.98 0 2.75 7.47 0 6.68 7.25 0 6.07 7.69 0 3.18
  [4,288,7.98,0,2.75,7.47,0,6.68,7.25,0,6.07,7.69,0,3.18],
// 3 288 -4.82 0 7.72 -4.43 0 8.03 -7.22 0 8.14
  [3,288,-4.82,0,7.72,-4.43,0,8.03,-7.22,0,8.14],
// 3 288 -7.65 0 2.27 -7.57 0 2.76 -8.5 0 1.67
  [3,288,-7.65,0,2.27,-7.57,0,2.76,-8.5,0,1.67],
// 4 288 9.5 0 -8.8 8.9 0 -9.4 9.22 0 -9.34 9.44 0 -9.12
  [4,288,9.5,0,-8.8,8.9,0,-9.4,9.22,0,-9.34,9.44,0,-9.12],
// 4 288 -8.5 0 -8.42 -8.87 0 -9.4 8.9 0 -9.4 8.51 0 -8.43
  [4,288,-8.5,0,-8.42,-8.87,0,-9.4,8.9,0,-9.4,8.51,0,-8.43],
// 4 288 8.5 0 1.67 8.51 0 -8.43 8.9 0 -9.4 9.5 0 -8.8
  [4,288,8.5,0,1.67,8.51,0,-8.43,8.9,0,-9.4,9.5,0,-8.8],
// 4 288 -9.47 0 -8.8 -9.41 0 -9.12 -9.19 0 -9.34 -8.87 0 -9.4
  [4,288,-9.47,0,-8.8,-9.41,0,-9.12,-9.19,0,-9.34,-8.87,0,-9.4],
// 4 288 -9.47 0 8.82 -9.47 0 -8.8 -8.5 0 -8.42 -8.5 0 1.67
  [4,288,-9.47,0,8.82,-9.47,0,-8.8,-8.5,0,-8.42,-8.5,0,1.67],
// 3 288 -8.5 0 -8.42 -9.47 0 -8.8 -8.87 0 -9.4
  [3,288,-8.5,0,-8.42,-9.47,0,-8.8,-8.87,0,-9.4],
// 4 288 6.65 0 -4.74 6.65 0 -4.24 4.25 0 -4.24 4.25 0 -4.74
  [4,288,6.65,0,-4.74,6.65,0,-4.24,4.25,0,-4.24,4.25,0,-4.74],
// 4 288 2.35 0 -2.24 2.35 0 -2.73 6.65 0 -2.74 6.65 0 -2.24
  [4,288,2.35,0,-2.24,2.35,0,-2.73,6.65,0,-2.74,6.65,0,-2.24],
// 4 288 1.01 0 2.88 -.02 0 2.89 -8.5 0 1.67 8.5 0 1.67
  [4,288,1.01,0,2.88,-.02,0,2.89,-8.5,0,1.67,8.5,0,1.67],
// 3 288 -7.65 0 2.27 -8.5 0 1.67 -7.07 0 2.37
  [3,288,-7.65,0,2.27,-8.5,0,1.67,-7.07,0,2.37],
// 4 288 4.6 0 3.9 4.48 0 3.69 5.54 0 3.25 5.36 0 3.65
  [4,288,4.6,0,3.9,4.48,0,3.69,5.54,0,3.25,5.36,0,3.65],
// 4 288 4.48 0 3.69 3.79 0 3.35 5.85 0 2.92 5.54 0 3.25
  [4,288,4.48,0,3.69,3.79,0,3.35,5.85,0,2.92,5.54,0,3.25],
// 4 288 3.79 0 3.35 2.77 0 3.1 6.23 0 2.69 5.85 0 2.92
  [4,288,3.79,0,3.35,2.77,0,3.1,6.23,0,2.69,5.85,0,2.92],
// 4 288 1.01 0 2.88 8.5 0 1.67 6.23 0 2.69 2.77 0 3.1
  [4,288,1.01,0,2.88,8.5,0,1.67,6.23,0,2.69,2.77,0,3.1],
// 3 288 6.66 0 2.57 6.23 0 2.69 8.5 0 1.67
  [3,288,6.66,0,2.57,6.23,0,2.69,8.5,0,1.67],
// 4 288 -4.74 0 4.4 -5.5 0 3.84 -5.62 0 3.27 -3.89 0 3.9
  [4,288,-4.74,0,4.4,-5.5,0,3.84,-5.62,0,3.27,-3.89,0,3.9],
// 4 288 -3.89 0 3.9 -5.62 0 3.27 -6 0 2.83 -2.99 0 3.5
  [4,288,-3.89,0,3.9,-5.62,0,3.27,-6,0,2.83,-2.99,0,3.5],
// 4 288 -2.99 0 3.5 -6 0 2.83 -6.51 0 2.54 -2.03 0 3.2
  [4,288,-2.99,0,3.5,-6,0,2.83,-6.51,0,2.54,-2.03,0,3.2],
// 3 288 -1.04 0 2.99 -2.03 0 3.2 -6.51 0 2.54
  [3,288,-1.04,0,2.99,-2.03,0,3.2,-6.51,0,2.54],
// 4 288 -7.07 0 2.37 -8.5 0 1.67 -1.04 0 2.99 -6.51 0 2.54
  [4,288,-7.07,0,2.37,-8.5,0,1.67,-1.04,0,2.99,-6.51,0,2.54],
// 3 288 -8.5 0 1.67 -.02 0 2.89 -1.04 0 2.99
  [3,288,-8.5,0,1.67,-.02,0,2.89,-1.04,0,2.99],
// 3 288 9.5 0 -8.8 9.5 0 8.82 8.5 0 1.67
  [3,288,9.5,0,-8.8,9.5,0,8.82,8.5,0,1.67],
// 3 288 7.98 0 2.75 7.55 0 2.61 8.5 0 1.67
  [3,288,7.98,0,2.75,7.55,0,2.61,8.5,0,1.67],
// 3 288 6.66 0 2.57 8.5 0 1.67 7.11 0 2.55
  [3,288,6.66,0,2.57,8.5,0,1.67,7.11,0,2.55],
// 4 288 5.86 0 4.78 5.23 0 4.68 5.36 0 3.65 5.85 0 3.86
  [4,288,5.86,0,4.78,5.23,0,4.68,5.36,0,3.65,5.85,0,3.86],
// 3 288 2.24 0 3.72 3.91 0 3.91 2.67 0 4.6
  [3,288,2.24,0,3.72,3.91,0,3.91,2.67,0,4.6],
// 4 288 5.36 0 3.65 5.23 0 4.68 5.12 0 5.24 4.6 0 3.9
  [4,288,5.36,0,3.65,5.23,0,4.68,5.12,0,5.24,4.6,0,3.9],
// 3 288 2.67 0 4.6 3.91 0 3.91 2.69 0 4.94
  [3,288,2.67,0,4.6,3.91,0,3.91,2.69,0,4.94],
// 4 288 4.6 0 3.9 5.12 0 5.24 2.69 0 4.94 3.91 0 3.91
  [4,288,4.6,0,3.9,5.12,0,5.24,2.69,0,4.94,3.91,0,3.91],
// 3 288 2.63 0 5.09 2.69 0 4.94 5.12 0 5.24
  [3,288,2.63,0,5.09,2.69,0,4.94,5.12,0,5.24],
// 4 288 2.51 0 5.05 .07 0 5.47 1.56 0 3.98 1.85 0 4.22
  [4,288,2.51,0,5.05,.07,0,5.47,1.56,0,3.98,1.85,0,4.22],
// 4 288 .71 0 3.66 1.19 0 3.79 1.56 0 3.98 .07 0 5.47
  [4,288,.71,0,3.66,1.19,0,3.79,1.56,0,3.98,.07,0,5.47],
// 4 288 .07 0 5.47 -.36 0 5.04 .12 0 3.64 .71 0 3.66
  [4,288,.07,0,5.47,-.36,0,5.04,.12,0,3.64,.71,0,3.66],
// 4 288 .12 0 3.64 -.36 0 5.04 -.9 0 4.75 -.62 0 3.69
  [4,288,.12,0,3.64,-.36,0,5.04,-.9,0,4.75,-.62,0,3.69],
// 4 288 -1.78 0 5.62 -3.94 0 4.79 -2.7 0 4.19 -1.86 0 5
  [4,288,-1.78,0,5.62,-3.94,0,4.79,-2.7,0,4.19,-1.86,0,5],
// 4 288 -2.03 0 3.97 -1.79 0 4.65 -1.86 0 5 -2.7 0 4.19
  [4,288,-2.03,0,3.97,-1.79,0,4.65,-1.86,0,5,-2.7,0,4.19],
// 4 288 -2.03 0 3.97 -.62 0 3.69 -.9 0 4.75 -1.5 0 4.59
  [4,288,-2.03,0,3.97,-.62,0,3.69,-.9,0,4.75,-1.5,0,4.59],
// 3 288 -1.5 0 4.59 -1.79 0 4.65 -2.03 0 3.97
  [3,288,-1.5,0,4.59,-1.79,0,4.65,-2.03,0,3.97],
// 3 288 2.51 0 5.05 2.63 0 5.09 .07 0 5.47
  [3,288,2.51,0,5.05,2.63,0,5.09,.07,0,5.47],
// 4 288 2.53 0 5.67 .07 0 5.47 2.63 0 5.09 5.12 0 5.24
  [4,288,2.53,0,5.67,.07,0,5.47,2.63,0,5.09,5.12,0,5.24],
// 4 288 5.85 0 3.86 6.37 0 3.91 6.43 0 5.09 5.86 0 4.78
  [4,288,5.85,0,3.86,6.37,0,3.91,6.43,0,5.09,5.86,0,4.78],
// 4 288 7.25 0 6.07 6.91 0 5.52 6.87 0 3.83 7.31 0 3.56
  [4,288,7.25,0,6.07,6.91,0,5.52,6.87,0,3.83,7.31,0,3.56],
// 4 288 6.37 0 3.91 6.87 0 3.83 6.91 0 5.52 6.43 0 5.09
  [4,288,6.37,0,3.91,6.87,0,3.83,6.91,0,5.52,6.43,0,5.09],
// 4 288 8.5 0 1.67 9.5 0 8.82 7.47 0 6.68 7.98 0 2.75
  [4,288,8.5,0,1.67,9.5,0,8.82,7.47,0,6.68,7.98,0,2.75],
// 3 288 7.31 0 3.56 7.69 0 3.18 7.25 0 6.07
  [3,288,7.31,0,3.56,7.69,0,3.18,7.25,0,6.07],
// 3 288 9.5 0 8.82 7.58 0 7.31 7.47 0 6.68
  [3,288,9.5,0,8.82,7.58,0,7.31,7.47,0,6.68],
// 4 288 5.66 0 6.84 3.06 0 7.26 3.11 0 6.81 5.36 0 6.35
  [4,288,5.66,0,6.84,3.06,0,7.26,3.11,0,6.81,5.36,0,6.35],
// 3 288 3.06 0 7.26 5.66 0 6.84 2.92 0 7.69
  [3,288,3.06,0,7.26,5.66,0,6.84,2.92,0,7.69],
// 4 288 5.66 0 6.84 6.08 0 7.23 2.7 0 8.07 2.92 0 7.69
  [4,288,5.66,0,6.84,6.08,0,7.23,2.7,0,8.07,2.92,0,7.69],
// 4 288 7.58 0 7.31 9.5 0 8.82 8.9 0 9.42 7.61 0 7.96
  [4,288,7.58,0,7.31,9.5,0,8.82,8.9,0,9.42,7.61,0,7.96],
// 3 288 7.07 0 7.8 7.61 0 7.96 8.9 0 9.42
  [3,288,7.07,0,7.8,7.61,0,7.96,8.9,0,9.42],
// 4 288 8.9 0 9.42 2.42 0 8.43 6.55 0 7.55 7.07 0 7.8
  [4,288,8.9,0,9.42,2.42,0,8.43,6.55,0,7.55,7.07,0,7.8],
// 4 288 6.08 0 7.23 6.55 0 7.55 2.42 0 8.43 2.7 0 8.07
  [4,288,6.08,0,7.23,6.55,0,7.55,2.42,0,8.43,2.7,0,8.07],
// 4 288 -.01 0 7.14 2.11 0 8.01 2.42 0 8.43 -3.01 0 8.46
  [4,288,-.01,0,7.14,2.11,0,8.01,2.42,0,8.43,-3.01,0,8.46],
// 4 288 9.22 0 9.37 8.9 0 9.42 9.5 0 8.82 9.44 0 9.15
  [4,288,9.22,0,9.37,8.9,0,9.42,9.5,0,8.82,9.44,0,9.15],
// 4 288 8.9 0 9.42 -8.87 0 9.42 -3.01 0 8.46 2.42 0 8.43
  [4,288,8.9,0,9.42,-8.87,0,9.42,-3.01,0,8.46,2.42,0,8.43],
// 4 288 -9.19 0 9.37 -9.41 0 9.15 -9.47 0 8.82 -8.87 0 9.42
  [4,288,-9.19,0,9.37,-9.41,0,9.15,-9.47,0,8.82,-8.87,0,9.42],
// 3 288 -3.01 0 8.46 -8.87 0 9.42 -3.5 0 8.37
  [3,288,-3.01,0,8.46,-8.87,0,9.42,-3.5,0,8.37],
// 3 288 -6.12 0 6.72 -5.16 0 6.82 -5.1 0 7.31
  [3,288,-6.12,0,6.72,-5.16,0,6.82,-5.1,0,7.31],
// 3 288 -3.5 0 8.37 -8.87 0 9.42 -3.98 0 8.23
  [3,288,-3.5,0,8.37,-8.87,0,9.42,-3.98,0,8.23],
// 4 288 -7.45 0 8.23 -7.22 0 8.14 -3.98 0 8.23 -8.87 0 9.42
  [4,288,-7.45,0,8.23,-7.22,0,8.14,-3.98,0,8.23,-8.87,0,9.42],
// 4 288 -6.12 0 6.72 -5.1 0 7.31 -4.82 0 7.72 -7.22 0 8.14
  [4,288,-6.12,0,6.72,-5.1,0,7.31,-4.82,0,7.72,-7.22,0,8.14],
// 3 288 -3.98 0 8.23 -7.22 0 8.14 -4.43 0 8.03
  [3,288,-3.98,0,8.23,-7.22,0,8.14,-4.43,0,8.03],
// 4 288 -5.5 0 3.84 -4.74 0 4.4 -5.51 0 5.01 -5.59 0 4.09
  [4,288,-5.5,0,3.84,-4.74,0,4.4,-5.51,0,5.01,-5.59,0,4.09],
// 3 288 -5.59 0 4.09 -5.51 0 5.01 -5.84 0 4.18
  [3,288,-5.59,0,4.09,-5.51,0,5.01,-5.84,0,4.18],
// 4 288 -6.22 0 5.73 -6.33 0 4.16 -5.84 0 4.18 -5.51 0 5.01
  [4,288,-6.22,0,5.73,-6.33,0,4.16,-5.84,0,4.18,-5.51,0,5.01],
// 4 288 -6.83 0 6.55 -6.79 0 3.98 -6.33 0 4.16 -6.22 0 5.73
  [4,288,-6.83,0,6.55,-6.79,0,3.98,-6.33,0,4.16,-6.22,0,5.73],
// 4 288 -7.09 0 7.02 -7.14 0 3.65 -6.79 0 3.98 -6.83 0 6.55
  [4,288,-7.09,0,7.02,-7.14,0,3.65,-6.79,0,3.98,-6.83,0,6.55],
// 4 288 -8.87 0 9.42 -9.47 0 8.82 -7.37 0 7.66 -7.45 0 8.23
  [4,288,-8.87,0,9.42,-9.47,0,8.82,-7.37,0,7.66,-7.45,0,8.23],
// 4 288 -7.37 0 7.66 -9.47 0 8.82 -7.14 0 3.65 -7.09 0 7.02
  [4,288,-7.37,0,7.66,-9.47,0,8.82,-7.14,0,3.65,-7.09,0,7.02],
// 4 288 -8.5 0 1.67 -7.39 0 3.22 -7.14 0 3.65 -9.47 0 8.82
  [4,288,-8.5,0,1.67,-7.39,0,3.22,-7.14,0,3.65,-9.47,0,8.82],
// 3 288 -7.39 0 3.22 -8.5 0 1.67 -7.57 0 2.76
  [3,288,-7.39,0,3.22,-8.5,0,1.67,-7.57,0,2.76],
// 4 288 -3.88 0 6.77 -4.32 0 6.58 -5.05 0 5.6 -3.94 0 4.79
  [4,288,-3.88,0,6.77,-4.32,0,6.58,-5.05,0,5.6,-3.94,0,4.79],
// 3 288 -5.05 0 5.6 -4.81 0 6.56 -5.07 0 6.64
  [3,288,-5.05,0,5.6,-4.81,0,6.56,-5.07,0,6.64],
// 4 288 -5.05 0 5.6 -5.07 0 6.64 -5.16 0 6.82 -6.12 0 6.72
  [4,288,-5.05,0,5.6,-5.07,0,6.64,-5.16,0,6.82,-6.12,0,6.72],
// 3 288 -4.81 0 6.56 -5.05 0 5.6 -4.32 0 6.58
  [3,288,-4.81,0,6.56,-5.05,0,5.6,-4.32,0,6.58],
// 3 288 -3.94 0 4.79 -1.78 0 5.62 -3.88 0 6.77
  [3,288,-3.94,0,4.79,-1.78,0,5.62,-3.88,0,6.77],
// 4 288 -1.54 0 6.18 -3.53 0 7.1 -3.88 0 6.77 -1.78 0 5.62
  [4,288,-1.54,0,6.18,-3.53,0,7.1,-3.88,0,6.77,-1.78,0,5.62],
// 3 288 -3.53 0 7.1 -1.54 0 6.18 -3.27 0 7.52
  [3,288,-3.53,0,7.1,-1.54,0,6.18,-3.27,0,7.52],
// 3 288 -.6 0 6.96 -.01 0 7.14 -3.01 0 8.46
  [3,288,-.6,0,6.96,-.01,0,7.14,-3.01,0,8.46],
// 4 288 -1.54 0 6.18 -1.13 0 6.64 -3.12 0 7.98 -3.27 0 7.52
  [4,288,-1.54,0,6.18,-1.13,0,6.64,-3.12,0,7.98,-3.27,0,7.52],
// 4 288 -.6 0 6.96 -3.01 0 8.46 -3.12 0 7.98 -1.13 0 6.64
  [4,288,-.6,0,6.96,-3.01,0,8.46,-3.12,0,7.98,-1.13,0,6.64],
// 4 288 1.88 0 7.53 2.11 0 8.01 -.01 0 7.14 .61 0 7.21
  [4,288,1.88,0,7.53,2.11,0,8.01,-.01,0,7.14,.61,0,7.21],
// 4 288 1.88 0 7.53 .61 0 7.21 .52 0 6.6 1.83 0 7.01
  [4,288,1.88,0,7.53,.61,0,7.21,.52,0,6.6,1.83,0,7.01],
// 4 288 .36 0 6.01 .07 0 5.47 2.53 0 5.67 2.16 0 6.04
  [4,288,.36,0,6.01,.07,0,5.47,2.53,0,5.67,2.16,0,6.04],
// 4 288 1.83 0 7.01 .52 0 6.6 .36 0 6.01 1.91 0 6.49
  [4,288,1.83,0,7.01,.52,0,6.6,.36,0,6.01,1.91,0,6.49],
// 3 288 1.91 0 6.49 .36 0 6.01 2.16 0 6.04
  [3,288,1.91,0,6.49,.36,0,6.01,2.16,0,6.04],
// 4 288 3.11 0 6.81 3.05 0 6.37 5.18 0 5.81 5.36 0 6.35
  [4,288,3.11,0,6.81,3.05,0,6.37,5.18,0,5.81,5.36,0,6.35],
// 4 288 5.12 0 5.24 5.18 0 5.81 3.05 0 6.37 2.86 0 5.96
  [4,288,5.12,0,5.24,5.18,0,5.81,3.05,0,6.37,2.86,0,5.96],
// 3 288 2.86 0 5.96 2.53 0 5.67 5.12 0 5.24
  [3,288,2.86,0,5.96,2.53,0,5.67,5.12,0,5.24],
// 4 288 -1.7 0 -2.24 -1.7 0 -2.75 1.6 0 -2.74 1.6 0 -2.25
  [4,288,-1.7,0,-2.24,-1.7,0,-2.75,1.6,0,-2.74,1.6,0,-2.25],
// 4 288 -1.7 0 -4.24 -1.7 0 -4.74 3.5 0 -4.74 3.5 0 -4.24
  [4,288,-1.7,0,-4.24,-1.7,0,-4.74,3.5,0,-4.74,3.5,0,-4.24],
// 4 288 3.43 0 -6.24 -1.7 0 -6.25 -1.69 0 -6.72 3.42 0 -6.73
  [4,288,3.43,0,-6.24,-1.7,0,-6.25,-1.69,0,-6.72,3.42,0,-6.73],
// 4 378 6.64 0 .2 -1.69 0 .21 -1.7 0 -.76 6.64 0 -.75
  [4,378,6.64,0,.2,-1.69,0,.21,-1.7,0,-.76,6.64,0,-.75],
// 3 378 -6.84 0 -2.51 -6.96 0 -3.15 -6.49 0 -1.96
  [3,378,-6.84,0,-2.51,-6.96,0,-3.15,-6.49,0,-1.96],
// 4 378 -5.96 0 -1.58 -3.68 0 -2.24 -4.11 0 -1.75 -5.34 0 -1.4
  [4,378,-5.96,0,-1.58,-3.68,0,-2.24,-4.11,0,-1.75,-5.34,0,-1.4],
// 3 378 -4.69 0 -1.45 -5.34 0 -1.4 -4.11 0 -1.75
  [3,378,-4.69,0,-1.45,-5.34,0,-1.4,-4.11,0,-1.75],
// 4 378 -3.44 0 -3.5 -3.45 0 -2.84 -4.12 0 -4.57 -3.68 0 -4.1
  [4,378,-3.44,0,-3.5,-3.45,0,-2.84,-4.12,0,-4.57,-3.68,0,-4.1],
// 4 378 -3.68 0 -2.24 -4.71 0 -4.86 -4.12 0 -4.57 -3.45 0 -2.84
  [4,378,-3.68,0,-2.24,-4.71,0,-4.86,-4.12,0,-4.57,-3.45,0,-2.84],
// 4 378 -4.71 0 -4.86 -6.49 0 -4.35 -5.98 0 -4.75 -5.36 0 -4.93
  [4,378,-4.71,0,-4.86,-6.49,0,-4.35,-5.98,0,-4.75,-5.36,0,-4.93],
// 3 378 -6.83 0 -3.79 -6.49 0 -4.35 -4.71 0 -4.86
  [3,378,-6.83,0,-3.79,-6.49,0,-4.35,-4.71,0,-4.86],
// 4 378 -5.96 0 -1.58 -6.49 0 -1.96 -6.96 0 -3.15 -6.83 0 -3.79
  [4,378,-5.96,0,-1.58,-6.49,0,-1.96,-6.96,0,-3.15,-6.83,0,-3.79],
// 4 378 -5.96 0 -1.58 -6.83 0 -3.79 -4.71 0 -4.86 -3.68 0 -2.24
  [4,378,-5.96,0,-1.58,-6.83,0,-3.79,-4.71,0,-4.86,-3.68,0,-2.24],
];
module ldraw_lib__3070bp1r(step=0, col=false, unit=2/5, alt=false, line=0.2, solid=!$preview)
    makepoly(ldraw_lib__3070bp1r(), step=step, col=col, unit=unit, alt=alt, line=line, solid=solid);
ldraw_lib__3070bp1r(line=0.2);
